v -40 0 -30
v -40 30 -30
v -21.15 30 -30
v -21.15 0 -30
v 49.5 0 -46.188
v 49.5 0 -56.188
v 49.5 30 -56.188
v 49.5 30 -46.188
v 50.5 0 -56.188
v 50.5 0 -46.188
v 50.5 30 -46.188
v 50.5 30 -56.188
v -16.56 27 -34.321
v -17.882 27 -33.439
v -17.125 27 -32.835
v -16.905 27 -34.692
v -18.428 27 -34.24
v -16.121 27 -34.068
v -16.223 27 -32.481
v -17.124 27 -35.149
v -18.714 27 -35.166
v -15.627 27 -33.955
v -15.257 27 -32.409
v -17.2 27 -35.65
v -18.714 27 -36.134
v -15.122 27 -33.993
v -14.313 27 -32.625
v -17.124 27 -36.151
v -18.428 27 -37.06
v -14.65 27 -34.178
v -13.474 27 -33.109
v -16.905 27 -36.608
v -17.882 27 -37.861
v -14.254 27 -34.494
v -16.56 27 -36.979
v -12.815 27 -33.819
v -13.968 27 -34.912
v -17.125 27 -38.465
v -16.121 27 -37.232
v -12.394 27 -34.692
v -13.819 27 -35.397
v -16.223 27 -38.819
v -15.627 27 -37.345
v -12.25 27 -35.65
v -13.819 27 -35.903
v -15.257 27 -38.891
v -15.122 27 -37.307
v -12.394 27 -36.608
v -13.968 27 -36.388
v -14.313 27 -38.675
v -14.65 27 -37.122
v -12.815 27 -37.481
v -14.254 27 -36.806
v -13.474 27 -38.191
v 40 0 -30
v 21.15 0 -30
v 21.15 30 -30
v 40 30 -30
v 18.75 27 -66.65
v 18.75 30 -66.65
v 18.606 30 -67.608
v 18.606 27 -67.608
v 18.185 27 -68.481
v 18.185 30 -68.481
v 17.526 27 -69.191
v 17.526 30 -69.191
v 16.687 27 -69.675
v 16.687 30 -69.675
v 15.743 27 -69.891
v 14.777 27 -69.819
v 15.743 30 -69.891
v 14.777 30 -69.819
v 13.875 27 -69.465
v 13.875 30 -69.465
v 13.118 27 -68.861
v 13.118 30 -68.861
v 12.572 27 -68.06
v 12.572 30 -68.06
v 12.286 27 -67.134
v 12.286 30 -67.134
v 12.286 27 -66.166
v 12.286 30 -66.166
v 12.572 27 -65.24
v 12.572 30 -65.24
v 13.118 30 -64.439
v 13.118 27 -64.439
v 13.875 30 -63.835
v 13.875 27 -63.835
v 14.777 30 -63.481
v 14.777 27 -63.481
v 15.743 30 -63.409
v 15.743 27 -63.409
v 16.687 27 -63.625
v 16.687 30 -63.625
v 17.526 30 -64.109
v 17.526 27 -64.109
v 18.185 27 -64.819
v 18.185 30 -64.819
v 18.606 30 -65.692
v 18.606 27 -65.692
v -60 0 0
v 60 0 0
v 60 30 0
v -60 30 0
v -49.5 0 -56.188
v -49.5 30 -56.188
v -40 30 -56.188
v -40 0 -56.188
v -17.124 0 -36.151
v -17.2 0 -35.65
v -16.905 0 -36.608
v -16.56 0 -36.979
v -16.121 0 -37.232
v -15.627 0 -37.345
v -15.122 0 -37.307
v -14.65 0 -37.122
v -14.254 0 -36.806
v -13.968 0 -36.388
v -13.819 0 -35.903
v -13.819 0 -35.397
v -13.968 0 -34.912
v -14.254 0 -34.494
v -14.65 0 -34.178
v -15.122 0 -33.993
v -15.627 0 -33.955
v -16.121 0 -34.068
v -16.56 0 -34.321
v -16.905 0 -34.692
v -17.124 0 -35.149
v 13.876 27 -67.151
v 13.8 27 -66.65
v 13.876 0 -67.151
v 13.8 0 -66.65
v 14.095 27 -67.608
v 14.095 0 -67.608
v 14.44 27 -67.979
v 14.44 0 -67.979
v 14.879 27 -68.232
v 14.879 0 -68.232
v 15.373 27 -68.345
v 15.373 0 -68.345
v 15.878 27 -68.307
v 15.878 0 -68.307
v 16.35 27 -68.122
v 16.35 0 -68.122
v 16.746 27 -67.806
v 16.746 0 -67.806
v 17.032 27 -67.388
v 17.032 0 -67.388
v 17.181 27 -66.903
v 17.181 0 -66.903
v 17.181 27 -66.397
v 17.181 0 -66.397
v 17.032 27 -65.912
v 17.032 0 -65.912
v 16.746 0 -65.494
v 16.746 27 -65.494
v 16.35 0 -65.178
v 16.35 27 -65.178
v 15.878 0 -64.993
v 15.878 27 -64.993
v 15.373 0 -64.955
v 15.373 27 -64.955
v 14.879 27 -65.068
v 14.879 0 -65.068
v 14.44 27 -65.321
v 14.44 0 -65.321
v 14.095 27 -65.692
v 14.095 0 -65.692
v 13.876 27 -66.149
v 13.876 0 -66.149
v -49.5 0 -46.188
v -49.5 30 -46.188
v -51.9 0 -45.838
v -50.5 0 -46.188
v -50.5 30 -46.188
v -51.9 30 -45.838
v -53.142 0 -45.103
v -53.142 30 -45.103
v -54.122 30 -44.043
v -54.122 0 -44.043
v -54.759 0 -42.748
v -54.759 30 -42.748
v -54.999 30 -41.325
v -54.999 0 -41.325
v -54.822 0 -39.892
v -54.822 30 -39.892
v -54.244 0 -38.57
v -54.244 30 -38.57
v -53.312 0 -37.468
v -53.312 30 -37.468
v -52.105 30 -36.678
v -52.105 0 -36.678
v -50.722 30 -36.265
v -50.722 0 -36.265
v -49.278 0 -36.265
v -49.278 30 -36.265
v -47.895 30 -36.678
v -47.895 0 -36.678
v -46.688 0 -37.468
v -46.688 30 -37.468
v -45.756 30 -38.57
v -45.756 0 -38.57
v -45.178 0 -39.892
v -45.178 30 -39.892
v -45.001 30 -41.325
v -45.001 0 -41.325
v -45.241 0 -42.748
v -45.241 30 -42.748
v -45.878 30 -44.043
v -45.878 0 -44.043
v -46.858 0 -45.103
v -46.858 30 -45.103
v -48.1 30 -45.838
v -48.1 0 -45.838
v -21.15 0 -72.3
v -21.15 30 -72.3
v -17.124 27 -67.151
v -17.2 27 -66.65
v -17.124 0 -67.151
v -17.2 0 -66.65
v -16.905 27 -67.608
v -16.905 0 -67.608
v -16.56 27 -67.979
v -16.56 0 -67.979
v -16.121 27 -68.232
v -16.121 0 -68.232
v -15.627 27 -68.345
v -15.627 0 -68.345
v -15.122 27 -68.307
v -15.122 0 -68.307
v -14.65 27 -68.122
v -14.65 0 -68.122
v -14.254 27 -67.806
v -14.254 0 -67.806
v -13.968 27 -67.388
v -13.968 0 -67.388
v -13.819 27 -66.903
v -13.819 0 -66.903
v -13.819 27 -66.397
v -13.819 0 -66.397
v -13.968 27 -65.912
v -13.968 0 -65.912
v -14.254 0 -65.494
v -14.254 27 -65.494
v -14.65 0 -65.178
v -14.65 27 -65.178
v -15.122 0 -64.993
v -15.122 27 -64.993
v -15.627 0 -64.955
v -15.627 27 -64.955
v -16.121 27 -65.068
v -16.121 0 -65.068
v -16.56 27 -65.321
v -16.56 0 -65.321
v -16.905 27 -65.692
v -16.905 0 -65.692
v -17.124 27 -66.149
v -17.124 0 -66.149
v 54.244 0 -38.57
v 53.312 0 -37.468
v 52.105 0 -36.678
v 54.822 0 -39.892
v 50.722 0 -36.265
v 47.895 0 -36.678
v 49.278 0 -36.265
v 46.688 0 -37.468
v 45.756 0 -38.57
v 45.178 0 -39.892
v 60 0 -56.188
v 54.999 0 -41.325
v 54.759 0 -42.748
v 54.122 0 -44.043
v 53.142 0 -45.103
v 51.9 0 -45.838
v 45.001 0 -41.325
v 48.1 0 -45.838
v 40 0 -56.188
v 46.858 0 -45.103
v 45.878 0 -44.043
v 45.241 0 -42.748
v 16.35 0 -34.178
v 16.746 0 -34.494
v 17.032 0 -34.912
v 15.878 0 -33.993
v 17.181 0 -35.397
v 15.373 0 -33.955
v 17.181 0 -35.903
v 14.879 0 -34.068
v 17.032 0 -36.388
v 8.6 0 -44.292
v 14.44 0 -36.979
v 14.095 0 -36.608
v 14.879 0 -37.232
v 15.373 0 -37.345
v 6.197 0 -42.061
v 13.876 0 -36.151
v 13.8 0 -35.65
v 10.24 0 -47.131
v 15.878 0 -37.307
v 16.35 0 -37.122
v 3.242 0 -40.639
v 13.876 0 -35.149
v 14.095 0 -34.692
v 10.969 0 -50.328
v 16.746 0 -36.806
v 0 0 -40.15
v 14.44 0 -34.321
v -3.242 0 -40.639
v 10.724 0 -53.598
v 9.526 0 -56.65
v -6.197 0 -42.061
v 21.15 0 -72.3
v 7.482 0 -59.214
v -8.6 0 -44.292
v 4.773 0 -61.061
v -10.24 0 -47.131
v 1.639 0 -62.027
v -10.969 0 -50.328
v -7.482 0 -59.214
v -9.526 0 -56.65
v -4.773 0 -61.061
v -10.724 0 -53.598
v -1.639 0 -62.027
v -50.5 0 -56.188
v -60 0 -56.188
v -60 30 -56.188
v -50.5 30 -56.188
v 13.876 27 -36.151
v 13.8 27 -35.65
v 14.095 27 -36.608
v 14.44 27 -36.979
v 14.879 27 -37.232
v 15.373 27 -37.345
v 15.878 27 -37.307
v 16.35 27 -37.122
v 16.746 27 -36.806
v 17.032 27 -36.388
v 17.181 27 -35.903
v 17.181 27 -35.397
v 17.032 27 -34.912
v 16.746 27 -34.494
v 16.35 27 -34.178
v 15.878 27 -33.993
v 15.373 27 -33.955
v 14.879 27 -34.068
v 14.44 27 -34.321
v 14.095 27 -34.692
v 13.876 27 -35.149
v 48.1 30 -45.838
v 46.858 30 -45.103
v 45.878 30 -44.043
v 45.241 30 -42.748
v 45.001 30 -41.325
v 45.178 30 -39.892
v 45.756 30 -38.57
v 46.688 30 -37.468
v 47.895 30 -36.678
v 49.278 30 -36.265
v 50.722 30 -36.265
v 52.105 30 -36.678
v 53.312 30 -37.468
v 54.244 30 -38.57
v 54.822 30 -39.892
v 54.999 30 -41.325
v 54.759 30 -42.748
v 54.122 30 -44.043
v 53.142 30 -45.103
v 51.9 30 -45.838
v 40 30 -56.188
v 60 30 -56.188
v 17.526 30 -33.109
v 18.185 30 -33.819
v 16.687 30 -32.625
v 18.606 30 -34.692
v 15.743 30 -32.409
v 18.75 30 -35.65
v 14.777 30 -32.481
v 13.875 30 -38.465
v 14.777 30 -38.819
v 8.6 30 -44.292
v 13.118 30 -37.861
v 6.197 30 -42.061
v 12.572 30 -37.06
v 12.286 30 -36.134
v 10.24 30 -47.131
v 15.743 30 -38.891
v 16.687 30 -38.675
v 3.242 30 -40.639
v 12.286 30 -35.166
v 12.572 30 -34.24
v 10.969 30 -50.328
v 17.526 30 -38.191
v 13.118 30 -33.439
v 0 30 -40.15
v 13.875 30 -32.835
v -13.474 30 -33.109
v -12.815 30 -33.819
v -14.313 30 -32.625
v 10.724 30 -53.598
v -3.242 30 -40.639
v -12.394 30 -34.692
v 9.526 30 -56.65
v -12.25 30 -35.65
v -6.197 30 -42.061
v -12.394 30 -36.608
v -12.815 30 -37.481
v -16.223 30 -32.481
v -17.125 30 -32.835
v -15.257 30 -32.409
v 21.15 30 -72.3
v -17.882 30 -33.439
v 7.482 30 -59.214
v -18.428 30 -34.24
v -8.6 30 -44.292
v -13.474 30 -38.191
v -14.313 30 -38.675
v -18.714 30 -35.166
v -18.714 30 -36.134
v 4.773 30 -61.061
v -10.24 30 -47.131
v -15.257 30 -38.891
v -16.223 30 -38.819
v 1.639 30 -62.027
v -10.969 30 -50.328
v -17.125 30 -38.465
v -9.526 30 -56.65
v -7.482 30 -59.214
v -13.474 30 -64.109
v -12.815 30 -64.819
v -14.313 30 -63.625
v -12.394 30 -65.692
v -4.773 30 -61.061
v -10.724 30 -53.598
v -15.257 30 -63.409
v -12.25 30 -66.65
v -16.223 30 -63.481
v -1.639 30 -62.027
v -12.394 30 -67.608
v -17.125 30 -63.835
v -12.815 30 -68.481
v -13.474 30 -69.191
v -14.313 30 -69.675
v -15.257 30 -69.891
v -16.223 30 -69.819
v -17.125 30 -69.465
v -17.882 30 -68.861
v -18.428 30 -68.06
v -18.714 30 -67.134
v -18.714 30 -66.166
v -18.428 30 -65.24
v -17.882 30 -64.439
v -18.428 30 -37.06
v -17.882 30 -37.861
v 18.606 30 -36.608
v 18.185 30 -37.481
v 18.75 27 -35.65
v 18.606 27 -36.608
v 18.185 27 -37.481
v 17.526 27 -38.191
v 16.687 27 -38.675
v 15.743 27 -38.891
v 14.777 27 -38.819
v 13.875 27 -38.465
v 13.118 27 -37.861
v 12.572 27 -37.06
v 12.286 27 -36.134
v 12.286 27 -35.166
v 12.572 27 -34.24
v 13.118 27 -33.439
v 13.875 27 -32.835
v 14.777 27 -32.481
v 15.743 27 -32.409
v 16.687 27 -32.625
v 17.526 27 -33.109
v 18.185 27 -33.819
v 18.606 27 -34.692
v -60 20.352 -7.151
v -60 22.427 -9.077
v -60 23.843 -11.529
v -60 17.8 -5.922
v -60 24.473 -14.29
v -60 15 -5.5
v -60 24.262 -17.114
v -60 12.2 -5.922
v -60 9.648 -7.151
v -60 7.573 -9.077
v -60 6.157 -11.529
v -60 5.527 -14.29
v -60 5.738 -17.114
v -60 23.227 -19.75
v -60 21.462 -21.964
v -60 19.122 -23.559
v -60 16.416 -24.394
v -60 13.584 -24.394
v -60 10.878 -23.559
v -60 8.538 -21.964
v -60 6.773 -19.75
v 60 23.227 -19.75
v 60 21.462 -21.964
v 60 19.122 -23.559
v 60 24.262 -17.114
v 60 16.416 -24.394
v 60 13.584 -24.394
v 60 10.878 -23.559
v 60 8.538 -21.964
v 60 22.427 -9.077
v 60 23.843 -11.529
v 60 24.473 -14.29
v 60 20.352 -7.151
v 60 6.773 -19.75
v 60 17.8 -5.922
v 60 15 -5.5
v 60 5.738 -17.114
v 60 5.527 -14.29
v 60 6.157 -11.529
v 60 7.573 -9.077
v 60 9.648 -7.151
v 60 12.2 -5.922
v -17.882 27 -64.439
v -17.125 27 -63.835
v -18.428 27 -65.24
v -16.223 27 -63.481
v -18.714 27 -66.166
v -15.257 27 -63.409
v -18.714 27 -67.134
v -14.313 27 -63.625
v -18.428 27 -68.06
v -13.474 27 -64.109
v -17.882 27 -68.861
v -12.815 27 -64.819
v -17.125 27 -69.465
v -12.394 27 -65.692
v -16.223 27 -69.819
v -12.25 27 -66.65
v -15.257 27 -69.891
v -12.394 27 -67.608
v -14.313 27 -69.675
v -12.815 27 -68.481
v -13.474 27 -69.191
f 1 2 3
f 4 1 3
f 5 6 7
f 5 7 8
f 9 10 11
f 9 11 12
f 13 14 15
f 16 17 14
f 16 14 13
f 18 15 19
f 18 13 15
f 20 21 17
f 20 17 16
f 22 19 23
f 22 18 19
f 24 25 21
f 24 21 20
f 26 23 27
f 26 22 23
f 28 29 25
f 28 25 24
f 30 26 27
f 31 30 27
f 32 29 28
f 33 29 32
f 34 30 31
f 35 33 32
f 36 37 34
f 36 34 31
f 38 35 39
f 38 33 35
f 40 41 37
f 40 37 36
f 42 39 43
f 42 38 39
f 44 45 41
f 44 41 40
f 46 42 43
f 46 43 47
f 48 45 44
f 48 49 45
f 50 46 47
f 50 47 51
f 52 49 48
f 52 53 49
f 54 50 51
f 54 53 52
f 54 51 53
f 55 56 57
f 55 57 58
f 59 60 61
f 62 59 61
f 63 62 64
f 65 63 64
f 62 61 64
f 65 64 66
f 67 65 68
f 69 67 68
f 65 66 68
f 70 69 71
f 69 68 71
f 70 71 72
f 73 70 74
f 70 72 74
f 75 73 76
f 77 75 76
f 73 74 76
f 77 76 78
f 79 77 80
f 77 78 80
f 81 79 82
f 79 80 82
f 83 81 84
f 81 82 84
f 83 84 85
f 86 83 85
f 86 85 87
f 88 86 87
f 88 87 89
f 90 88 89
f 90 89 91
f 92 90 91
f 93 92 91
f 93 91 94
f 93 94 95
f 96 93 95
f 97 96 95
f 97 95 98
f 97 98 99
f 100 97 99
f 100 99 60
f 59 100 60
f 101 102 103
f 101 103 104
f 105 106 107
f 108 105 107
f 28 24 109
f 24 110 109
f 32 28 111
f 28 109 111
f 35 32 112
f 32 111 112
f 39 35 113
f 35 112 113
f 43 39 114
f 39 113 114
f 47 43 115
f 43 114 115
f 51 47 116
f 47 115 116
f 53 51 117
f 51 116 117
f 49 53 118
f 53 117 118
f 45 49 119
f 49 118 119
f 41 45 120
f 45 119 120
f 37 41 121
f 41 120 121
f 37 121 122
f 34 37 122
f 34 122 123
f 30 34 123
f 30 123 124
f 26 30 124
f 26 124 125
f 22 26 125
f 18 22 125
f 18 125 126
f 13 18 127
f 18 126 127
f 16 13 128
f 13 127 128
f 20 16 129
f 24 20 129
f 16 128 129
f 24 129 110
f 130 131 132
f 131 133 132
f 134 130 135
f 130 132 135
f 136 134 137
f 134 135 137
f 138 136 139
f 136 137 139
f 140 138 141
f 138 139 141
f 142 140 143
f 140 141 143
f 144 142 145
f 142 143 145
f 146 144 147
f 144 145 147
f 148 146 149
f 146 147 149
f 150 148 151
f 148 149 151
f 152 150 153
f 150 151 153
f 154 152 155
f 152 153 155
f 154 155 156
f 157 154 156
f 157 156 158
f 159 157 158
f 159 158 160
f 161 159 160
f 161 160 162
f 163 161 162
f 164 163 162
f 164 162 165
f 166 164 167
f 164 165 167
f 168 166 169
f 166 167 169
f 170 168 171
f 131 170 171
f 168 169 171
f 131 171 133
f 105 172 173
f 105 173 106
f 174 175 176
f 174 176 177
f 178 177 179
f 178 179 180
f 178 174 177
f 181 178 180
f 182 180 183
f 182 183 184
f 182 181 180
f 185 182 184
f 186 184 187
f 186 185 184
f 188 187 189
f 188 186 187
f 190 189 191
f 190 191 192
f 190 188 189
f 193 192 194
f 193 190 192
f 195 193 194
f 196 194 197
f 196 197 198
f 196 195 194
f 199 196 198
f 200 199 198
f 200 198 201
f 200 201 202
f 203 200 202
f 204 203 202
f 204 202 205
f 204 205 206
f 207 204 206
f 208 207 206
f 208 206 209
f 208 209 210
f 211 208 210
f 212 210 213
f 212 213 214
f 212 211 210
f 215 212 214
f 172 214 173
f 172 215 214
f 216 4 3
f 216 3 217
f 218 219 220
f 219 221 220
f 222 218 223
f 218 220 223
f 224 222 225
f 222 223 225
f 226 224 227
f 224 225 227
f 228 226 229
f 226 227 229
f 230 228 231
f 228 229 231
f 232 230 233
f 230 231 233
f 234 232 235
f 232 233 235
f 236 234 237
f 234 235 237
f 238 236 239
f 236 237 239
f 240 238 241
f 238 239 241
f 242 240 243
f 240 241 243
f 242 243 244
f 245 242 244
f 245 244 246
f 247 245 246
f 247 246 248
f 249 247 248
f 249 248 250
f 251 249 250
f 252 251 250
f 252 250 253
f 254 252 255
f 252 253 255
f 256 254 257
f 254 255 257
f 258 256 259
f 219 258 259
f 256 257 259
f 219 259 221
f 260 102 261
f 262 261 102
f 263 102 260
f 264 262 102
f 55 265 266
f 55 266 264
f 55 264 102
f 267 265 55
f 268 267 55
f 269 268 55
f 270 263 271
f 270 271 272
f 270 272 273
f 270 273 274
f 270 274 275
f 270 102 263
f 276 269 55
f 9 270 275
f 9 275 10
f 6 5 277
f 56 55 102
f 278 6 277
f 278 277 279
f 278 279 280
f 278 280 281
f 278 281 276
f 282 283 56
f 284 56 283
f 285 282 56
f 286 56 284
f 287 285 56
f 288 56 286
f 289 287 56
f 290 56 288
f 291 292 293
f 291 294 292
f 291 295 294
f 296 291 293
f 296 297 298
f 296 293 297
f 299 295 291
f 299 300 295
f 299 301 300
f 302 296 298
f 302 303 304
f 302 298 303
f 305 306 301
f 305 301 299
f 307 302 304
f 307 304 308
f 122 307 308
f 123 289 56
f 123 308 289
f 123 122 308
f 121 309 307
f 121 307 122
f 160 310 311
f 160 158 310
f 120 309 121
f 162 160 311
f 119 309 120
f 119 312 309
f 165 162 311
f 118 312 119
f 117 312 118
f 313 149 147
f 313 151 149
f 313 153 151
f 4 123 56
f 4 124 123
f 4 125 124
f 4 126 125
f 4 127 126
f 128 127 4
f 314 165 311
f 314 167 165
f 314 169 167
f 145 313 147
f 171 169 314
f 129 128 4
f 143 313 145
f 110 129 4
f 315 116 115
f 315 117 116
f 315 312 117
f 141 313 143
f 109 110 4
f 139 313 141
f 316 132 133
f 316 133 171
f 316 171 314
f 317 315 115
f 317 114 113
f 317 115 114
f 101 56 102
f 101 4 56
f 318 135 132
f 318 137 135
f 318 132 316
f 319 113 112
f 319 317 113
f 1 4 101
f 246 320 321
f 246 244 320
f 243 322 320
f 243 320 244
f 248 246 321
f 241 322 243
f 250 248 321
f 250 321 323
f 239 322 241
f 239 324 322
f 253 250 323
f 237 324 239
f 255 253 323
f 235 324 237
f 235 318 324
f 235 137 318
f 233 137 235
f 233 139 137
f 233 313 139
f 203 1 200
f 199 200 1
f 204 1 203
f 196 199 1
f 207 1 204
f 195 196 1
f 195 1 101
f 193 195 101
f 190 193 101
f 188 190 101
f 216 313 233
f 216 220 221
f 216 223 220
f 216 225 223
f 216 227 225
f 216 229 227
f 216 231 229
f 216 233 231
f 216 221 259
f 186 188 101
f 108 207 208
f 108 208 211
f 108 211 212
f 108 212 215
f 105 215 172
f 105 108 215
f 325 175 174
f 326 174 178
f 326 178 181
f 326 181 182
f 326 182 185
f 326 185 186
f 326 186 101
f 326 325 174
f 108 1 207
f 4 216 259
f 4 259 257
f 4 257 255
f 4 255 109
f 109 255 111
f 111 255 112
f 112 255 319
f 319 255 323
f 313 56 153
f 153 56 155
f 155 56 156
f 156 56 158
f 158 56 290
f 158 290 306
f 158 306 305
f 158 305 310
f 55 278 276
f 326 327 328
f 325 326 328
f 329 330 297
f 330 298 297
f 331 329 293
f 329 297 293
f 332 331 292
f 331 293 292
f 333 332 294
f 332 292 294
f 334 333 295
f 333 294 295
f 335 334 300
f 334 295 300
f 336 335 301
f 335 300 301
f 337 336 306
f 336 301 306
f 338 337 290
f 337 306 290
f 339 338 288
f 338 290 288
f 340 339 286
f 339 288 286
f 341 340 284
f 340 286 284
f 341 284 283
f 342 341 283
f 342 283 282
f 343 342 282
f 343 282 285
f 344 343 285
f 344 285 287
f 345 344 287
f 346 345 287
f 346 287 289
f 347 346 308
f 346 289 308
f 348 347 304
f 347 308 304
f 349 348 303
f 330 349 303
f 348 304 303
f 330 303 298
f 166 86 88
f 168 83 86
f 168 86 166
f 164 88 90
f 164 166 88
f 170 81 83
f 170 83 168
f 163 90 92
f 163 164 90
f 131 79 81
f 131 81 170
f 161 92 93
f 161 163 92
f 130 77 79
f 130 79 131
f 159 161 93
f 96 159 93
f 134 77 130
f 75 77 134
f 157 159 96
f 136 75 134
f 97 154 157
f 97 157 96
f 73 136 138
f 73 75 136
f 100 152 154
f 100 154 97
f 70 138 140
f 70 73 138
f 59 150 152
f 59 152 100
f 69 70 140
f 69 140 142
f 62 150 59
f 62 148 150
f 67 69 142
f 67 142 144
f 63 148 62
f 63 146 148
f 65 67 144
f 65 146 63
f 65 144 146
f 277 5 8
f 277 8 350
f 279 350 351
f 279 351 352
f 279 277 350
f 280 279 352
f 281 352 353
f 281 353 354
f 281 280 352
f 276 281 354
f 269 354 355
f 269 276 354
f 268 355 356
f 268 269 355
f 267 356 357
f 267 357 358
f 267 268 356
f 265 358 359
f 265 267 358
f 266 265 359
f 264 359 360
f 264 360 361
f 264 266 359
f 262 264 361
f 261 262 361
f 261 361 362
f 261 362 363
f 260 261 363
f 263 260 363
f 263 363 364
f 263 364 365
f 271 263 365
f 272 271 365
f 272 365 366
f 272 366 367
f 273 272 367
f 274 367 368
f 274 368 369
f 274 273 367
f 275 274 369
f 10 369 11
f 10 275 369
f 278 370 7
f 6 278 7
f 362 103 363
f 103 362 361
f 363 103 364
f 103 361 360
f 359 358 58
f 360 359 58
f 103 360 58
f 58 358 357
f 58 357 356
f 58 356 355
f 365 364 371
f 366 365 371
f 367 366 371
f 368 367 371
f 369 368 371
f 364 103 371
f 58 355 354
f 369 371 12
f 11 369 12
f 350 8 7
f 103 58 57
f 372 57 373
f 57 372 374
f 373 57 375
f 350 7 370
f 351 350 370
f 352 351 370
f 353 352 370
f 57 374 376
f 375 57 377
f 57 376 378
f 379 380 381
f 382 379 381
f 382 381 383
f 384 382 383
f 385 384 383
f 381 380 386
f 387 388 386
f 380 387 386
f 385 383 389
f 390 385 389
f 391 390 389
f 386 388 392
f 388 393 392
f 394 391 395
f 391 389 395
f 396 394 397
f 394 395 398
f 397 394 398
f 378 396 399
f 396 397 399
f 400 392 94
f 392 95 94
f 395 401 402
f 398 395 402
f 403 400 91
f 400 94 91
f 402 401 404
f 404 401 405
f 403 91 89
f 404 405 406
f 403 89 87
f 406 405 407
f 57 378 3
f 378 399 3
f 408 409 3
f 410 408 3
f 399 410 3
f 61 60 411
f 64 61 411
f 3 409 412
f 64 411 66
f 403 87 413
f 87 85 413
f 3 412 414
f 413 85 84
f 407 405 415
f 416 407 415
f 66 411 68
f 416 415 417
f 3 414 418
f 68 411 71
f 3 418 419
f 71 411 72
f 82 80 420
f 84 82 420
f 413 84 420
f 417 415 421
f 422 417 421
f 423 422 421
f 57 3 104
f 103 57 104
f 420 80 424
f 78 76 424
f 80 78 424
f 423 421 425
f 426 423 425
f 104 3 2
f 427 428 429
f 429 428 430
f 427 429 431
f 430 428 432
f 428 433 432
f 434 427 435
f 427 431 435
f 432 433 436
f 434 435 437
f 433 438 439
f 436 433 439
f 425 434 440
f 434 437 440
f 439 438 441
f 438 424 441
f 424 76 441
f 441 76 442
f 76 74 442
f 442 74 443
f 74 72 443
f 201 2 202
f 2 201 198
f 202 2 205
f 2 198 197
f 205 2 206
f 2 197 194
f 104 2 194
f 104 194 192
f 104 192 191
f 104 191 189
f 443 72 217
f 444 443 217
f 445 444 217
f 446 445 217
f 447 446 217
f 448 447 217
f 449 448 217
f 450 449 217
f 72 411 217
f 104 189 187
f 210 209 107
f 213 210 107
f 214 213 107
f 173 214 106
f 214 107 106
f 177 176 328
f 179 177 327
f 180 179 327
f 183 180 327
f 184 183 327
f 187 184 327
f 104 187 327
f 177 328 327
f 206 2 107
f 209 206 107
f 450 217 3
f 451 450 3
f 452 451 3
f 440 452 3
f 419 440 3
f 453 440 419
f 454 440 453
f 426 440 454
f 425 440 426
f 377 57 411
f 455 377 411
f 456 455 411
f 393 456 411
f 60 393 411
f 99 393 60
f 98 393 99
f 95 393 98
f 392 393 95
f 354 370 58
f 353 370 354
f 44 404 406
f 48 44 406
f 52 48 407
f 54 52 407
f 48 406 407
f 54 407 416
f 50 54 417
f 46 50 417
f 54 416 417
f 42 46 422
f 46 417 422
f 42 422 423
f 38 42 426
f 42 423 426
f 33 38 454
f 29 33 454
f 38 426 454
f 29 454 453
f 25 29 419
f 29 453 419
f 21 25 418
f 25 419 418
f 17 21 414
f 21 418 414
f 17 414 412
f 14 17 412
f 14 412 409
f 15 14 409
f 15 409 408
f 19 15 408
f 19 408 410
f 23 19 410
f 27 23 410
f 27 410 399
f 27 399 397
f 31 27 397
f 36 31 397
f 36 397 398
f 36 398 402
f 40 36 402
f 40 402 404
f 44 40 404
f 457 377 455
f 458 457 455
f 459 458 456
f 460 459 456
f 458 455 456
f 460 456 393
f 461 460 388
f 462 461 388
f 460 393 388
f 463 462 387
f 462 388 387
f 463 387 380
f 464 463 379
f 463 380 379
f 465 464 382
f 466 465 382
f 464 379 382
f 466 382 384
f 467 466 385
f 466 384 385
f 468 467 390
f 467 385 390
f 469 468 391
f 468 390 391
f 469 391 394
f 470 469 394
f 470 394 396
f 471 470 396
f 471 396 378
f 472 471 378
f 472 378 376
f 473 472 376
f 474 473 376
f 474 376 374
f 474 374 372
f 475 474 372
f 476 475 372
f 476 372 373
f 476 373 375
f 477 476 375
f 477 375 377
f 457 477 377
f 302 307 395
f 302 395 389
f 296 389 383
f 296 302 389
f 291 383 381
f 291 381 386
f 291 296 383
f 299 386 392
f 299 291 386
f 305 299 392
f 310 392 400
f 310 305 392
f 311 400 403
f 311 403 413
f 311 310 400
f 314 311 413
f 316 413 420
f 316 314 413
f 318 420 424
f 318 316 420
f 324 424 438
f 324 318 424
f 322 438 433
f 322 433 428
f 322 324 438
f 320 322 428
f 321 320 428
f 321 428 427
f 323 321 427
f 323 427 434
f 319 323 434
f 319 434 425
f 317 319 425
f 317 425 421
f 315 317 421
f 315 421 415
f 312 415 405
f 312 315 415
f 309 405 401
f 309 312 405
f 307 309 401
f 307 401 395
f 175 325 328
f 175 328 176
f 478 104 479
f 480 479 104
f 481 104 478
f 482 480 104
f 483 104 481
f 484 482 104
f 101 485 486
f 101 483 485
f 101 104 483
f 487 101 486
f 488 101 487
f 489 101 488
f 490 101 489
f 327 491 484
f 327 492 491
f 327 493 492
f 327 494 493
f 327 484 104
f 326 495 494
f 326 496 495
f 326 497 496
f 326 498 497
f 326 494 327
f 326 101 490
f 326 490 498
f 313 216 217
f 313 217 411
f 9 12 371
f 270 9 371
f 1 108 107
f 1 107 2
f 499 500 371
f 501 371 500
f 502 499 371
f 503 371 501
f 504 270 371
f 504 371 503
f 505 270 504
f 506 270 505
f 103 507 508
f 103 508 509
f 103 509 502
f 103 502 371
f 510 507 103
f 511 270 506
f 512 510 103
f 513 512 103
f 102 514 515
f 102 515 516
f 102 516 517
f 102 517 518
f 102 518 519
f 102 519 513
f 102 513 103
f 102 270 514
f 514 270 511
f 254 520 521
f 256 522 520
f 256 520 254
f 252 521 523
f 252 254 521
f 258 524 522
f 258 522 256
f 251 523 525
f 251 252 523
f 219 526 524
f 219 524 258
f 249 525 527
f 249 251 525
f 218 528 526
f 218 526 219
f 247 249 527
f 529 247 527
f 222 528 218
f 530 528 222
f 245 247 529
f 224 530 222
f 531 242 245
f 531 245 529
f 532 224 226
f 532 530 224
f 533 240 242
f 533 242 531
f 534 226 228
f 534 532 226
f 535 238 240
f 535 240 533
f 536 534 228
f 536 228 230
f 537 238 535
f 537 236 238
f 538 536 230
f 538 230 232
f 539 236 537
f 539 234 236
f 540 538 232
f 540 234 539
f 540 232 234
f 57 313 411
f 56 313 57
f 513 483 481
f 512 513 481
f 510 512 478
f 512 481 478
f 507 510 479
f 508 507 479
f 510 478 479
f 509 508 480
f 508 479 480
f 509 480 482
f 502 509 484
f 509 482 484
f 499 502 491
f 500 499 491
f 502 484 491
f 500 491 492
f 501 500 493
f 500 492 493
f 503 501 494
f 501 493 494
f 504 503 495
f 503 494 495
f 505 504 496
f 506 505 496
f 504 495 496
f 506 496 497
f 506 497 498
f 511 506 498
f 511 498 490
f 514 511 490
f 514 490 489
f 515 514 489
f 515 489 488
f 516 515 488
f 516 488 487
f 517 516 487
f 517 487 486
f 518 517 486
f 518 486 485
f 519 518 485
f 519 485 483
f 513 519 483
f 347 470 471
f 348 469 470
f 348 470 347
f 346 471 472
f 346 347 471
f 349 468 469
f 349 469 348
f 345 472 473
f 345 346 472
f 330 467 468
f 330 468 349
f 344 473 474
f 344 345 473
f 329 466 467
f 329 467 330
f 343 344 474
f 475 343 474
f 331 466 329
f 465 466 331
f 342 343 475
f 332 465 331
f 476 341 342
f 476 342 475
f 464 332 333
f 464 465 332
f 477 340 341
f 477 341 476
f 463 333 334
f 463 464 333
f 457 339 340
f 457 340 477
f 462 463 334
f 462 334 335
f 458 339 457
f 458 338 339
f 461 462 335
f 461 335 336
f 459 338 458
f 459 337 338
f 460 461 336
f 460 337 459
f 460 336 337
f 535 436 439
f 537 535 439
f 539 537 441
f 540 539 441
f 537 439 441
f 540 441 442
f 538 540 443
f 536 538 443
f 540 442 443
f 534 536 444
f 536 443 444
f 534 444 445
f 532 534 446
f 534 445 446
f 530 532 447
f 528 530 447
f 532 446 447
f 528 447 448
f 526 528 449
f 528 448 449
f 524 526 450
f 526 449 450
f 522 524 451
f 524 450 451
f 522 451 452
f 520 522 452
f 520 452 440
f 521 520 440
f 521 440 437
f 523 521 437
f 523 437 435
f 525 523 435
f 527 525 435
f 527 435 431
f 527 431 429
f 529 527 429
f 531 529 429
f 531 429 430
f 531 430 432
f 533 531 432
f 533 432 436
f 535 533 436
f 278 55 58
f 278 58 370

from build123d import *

# Parameters (mm, degrees)
SKETCH_3_R                  = 11
EXTRUDE_1_DEPTH             = 30
HOLE_WIZARD_M32_D           = 3.4
HOLE_WIZARD_M32_CBORE_D     = 6.5
HOLE_WIZARD_M32_CBORE_DEPTH = 3
SKETCH_15_R                 = 9.5
CUT_EXTRUDE_1_DEPTH         = 144.273479751


with BuildPart() as part:
    # Эскиз3 → Бобышка-Вытянуть1 (new body)
    with BuildSketch(Plane(origin=(0, 0, 0), x_dir=(1, 0, 0), z_dir=(0, 1, 0))):
        with BuildLine():
            Line((0, 0), (-60, 0))
            Line((-60, 0), (-60, 56.188060056))
            Line((-60, 56.188060056), (-50.5, 56.188060056))
            Line((-50.5, 56.188060056), (-50.5, 46.188060056))
            ThreePointArc((-50.5, 46.188060056), (-50, 36.21312287), (-49.5, 46.188060056))
            Line((-49.5, 46.188060056), (-49.5, 56.188060056))
            Line((-49.5, 56.188060056), (-40, 56.188060056))
            Line((-40, 56.188060056), (-40, 30))
            Line((-40, 30), (-21.15, 30))
            Line((-21.15, 30), (-21.15, 72.3))
            Line((-21.15, 72.3), (21.15, 72.3))
            Line((21.15, 72.3), (21.15, 30))
            Line((21.15, 30), (40, 30))
            Line((40, 30), (40, 56.188060056))
            Line((40, 56.188060056), (49.5, 56.188060056))
            Line((49.5, 56.188060056), (49.5, 46.188060056))
            ThreePointArc((49.5, 46.188060056), (50, 36.21312287), (50.5, 46.188060056))
            Line((50.5, 46.188060056), (50.5, 56.188060056))
            Line((50.5, 56.188060056), (60, 56.188060056))
            Line((60, 56.188060056), (60, 0))
            Line((60, 0), (0, 0))
        make_face()
        with Locations(Location((0, 51.15, 0), (0, 0, 270))):
            Circle(SKETCH_3_R, mode=Mode.SUBTRACT)
    extrude(amount=EXTRUDE_1_DEPTH)

    # Цековка для винта с внутренним шестигранником M32 (through all)
    with Locations(Plane(origin=(0, 30, 0), x_dir=(1, 0, 0), z_dir=(0, 1, 0))):
        with Locations((-15.5, 66.65), (15.5, 66.65), (15.5, 35.65), (-15.5, 35.65)):
            CounterBoreHole(HOLE_WIZARD_M32_D / 2, HOLE_WIZARD_M32_CBORE_D / 2, HOLE_WIZARD_M32_CBORE_DEPTH)

    # Эскиз15 → Вырез-Вытянуть1 (cut, through all)
    with BuildSketch(Plane.ZY.offset(60)):
        with Locations((-15, 15)):
            Circle(SKETCH_15_R)
    extrude(amount=-CUT_EXTRUDE_1_DEPTH, mode=Mode.SUBTRACT)


solid = part.part
